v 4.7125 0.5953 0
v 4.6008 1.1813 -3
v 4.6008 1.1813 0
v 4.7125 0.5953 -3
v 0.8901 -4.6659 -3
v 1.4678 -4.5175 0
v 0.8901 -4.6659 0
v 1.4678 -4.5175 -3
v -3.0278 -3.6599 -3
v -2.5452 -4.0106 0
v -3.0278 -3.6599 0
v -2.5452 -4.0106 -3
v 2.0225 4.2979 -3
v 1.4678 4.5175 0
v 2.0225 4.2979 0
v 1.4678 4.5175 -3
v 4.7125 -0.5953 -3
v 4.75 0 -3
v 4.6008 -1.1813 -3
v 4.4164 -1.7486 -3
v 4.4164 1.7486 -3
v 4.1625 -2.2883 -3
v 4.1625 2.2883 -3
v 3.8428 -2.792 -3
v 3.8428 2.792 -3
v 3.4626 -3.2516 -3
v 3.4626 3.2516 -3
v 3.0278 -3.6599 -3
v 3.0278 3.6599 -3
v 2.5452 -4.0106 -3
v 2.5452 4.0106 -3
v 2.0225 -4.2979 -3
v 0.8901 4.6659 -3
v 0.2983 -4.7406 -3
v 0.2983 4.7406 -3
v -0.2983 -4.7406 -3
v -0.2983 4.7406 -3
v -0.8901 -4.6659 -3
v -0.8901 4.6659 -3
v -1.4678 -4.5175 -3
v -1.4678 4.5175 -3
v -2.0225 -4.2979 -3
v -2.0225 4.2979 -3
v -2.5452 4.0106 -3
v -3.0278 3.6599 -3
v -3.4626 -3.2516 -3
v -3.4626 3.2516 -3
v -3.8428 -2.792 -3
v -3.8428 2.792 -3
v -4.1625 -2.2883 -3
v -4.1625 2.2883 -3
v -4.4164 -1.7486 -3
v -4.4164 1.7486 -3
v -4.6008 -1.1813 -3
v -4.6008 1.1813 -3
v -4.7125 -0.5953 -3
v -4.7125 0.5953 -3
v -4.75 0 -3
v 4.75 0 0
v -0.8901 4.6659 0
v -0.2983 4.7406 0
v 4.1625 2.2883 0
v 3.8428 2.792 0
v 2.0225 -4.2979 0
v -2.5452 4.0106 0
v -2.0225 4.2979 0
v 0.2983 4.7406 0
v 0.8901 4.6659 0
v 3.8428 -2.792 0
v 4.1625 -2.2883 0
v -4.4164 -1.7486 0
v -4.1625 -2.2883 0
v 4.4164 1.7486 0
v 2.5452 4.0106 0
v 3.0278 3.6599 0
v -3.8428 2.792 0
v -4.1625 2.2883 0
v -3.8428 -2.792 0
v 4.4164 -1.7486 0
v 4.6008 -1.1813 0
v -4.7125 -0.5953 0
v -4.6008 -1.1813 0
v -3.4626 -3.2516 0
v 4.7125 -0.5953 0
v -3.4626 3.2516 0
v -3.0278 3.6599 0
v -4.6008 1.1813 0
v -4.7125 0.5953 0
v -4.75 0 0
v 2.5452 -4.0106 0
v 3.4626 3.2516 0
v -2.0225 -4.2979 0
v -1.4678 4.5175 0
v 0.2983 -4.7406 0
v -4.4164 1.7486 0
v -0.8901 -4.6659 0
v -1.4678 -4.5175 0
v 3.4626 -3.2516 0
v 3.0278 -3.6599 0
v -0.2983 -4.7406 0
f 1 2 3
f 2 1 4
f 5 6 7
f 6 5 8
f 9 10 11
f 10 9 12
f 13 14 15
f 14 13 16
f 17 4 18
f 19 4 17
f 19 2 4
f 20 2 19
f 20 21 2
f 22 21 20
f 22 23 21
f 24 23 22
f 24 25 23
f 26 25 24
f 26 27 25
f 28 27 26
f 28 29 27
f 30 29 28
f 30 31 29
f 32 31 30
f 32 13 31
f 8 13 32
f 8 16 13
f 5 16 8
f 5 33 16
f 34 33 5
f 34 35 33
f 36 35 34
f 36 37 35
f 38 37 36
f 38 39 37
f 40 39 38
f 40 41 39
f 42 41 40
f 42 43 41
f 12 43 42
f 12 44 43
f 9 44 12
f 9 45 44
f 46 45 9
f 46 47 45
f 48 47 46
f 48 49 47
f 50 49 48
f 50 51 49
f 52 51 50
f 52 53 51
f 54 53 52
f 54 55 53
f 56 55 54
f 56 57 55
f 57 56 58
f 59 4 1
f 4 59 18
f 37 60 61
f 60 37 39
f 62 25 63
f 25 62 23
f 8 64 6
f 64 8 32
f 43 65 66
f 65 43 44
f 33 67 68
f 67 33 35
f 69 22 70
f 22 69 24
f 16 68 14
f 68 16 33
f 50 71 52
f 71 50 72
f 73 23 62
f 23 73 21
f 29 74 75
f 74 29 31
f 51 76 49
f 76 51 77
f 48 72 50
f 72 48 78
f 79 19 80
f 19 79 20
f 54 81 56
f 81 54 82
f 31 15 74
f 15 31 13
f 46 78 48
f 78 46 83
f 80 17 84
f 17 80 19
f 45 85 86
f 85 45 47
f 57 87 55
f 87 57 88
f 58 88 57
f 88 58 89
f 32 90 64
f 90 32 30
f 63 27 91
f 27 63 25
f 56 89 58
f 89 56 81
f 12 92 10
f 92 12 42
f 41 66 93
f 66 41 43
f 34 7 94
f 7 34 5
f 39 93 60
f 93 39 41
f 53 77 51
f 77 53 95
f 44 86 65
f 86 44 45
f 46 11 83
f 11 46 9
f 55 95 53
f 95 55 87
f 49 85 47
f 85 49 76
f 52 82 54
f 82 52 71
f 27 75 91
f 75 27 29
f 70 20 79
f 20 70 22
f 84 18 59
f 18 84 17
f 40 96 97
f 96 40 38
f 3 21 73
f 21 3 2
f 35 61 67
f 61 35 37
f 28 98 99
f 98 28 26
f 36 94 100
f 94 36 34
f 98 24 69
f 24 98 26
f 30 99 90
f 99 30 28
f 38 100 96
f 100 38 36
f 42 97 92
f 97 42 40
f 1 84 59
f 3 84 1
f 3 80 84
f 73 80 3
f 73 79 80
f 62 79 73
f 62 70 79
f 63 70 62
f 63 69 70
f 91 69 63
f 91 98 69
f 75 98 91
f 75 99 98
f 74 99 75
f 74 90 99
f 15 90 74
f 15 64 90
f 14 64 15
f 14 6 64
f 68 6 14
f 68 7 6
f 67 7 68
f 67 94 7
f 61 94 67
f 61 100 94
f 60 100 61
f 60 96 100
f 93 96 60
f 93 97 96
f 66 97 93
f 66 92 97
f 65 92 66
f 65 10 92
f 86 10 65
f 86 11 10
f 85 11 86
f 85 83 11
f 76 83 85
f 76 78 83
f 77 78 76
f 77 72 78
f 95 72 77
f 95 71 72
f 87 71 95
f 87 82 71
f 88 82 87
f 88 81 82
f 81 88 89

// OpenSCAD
$fn = 50;


difference() {
	union() {
		translate(v = [0, 0, -3.0000000000]) {
			cylinder(h = 3, r = 4.7500000000);
		}
	}
	union();
}
